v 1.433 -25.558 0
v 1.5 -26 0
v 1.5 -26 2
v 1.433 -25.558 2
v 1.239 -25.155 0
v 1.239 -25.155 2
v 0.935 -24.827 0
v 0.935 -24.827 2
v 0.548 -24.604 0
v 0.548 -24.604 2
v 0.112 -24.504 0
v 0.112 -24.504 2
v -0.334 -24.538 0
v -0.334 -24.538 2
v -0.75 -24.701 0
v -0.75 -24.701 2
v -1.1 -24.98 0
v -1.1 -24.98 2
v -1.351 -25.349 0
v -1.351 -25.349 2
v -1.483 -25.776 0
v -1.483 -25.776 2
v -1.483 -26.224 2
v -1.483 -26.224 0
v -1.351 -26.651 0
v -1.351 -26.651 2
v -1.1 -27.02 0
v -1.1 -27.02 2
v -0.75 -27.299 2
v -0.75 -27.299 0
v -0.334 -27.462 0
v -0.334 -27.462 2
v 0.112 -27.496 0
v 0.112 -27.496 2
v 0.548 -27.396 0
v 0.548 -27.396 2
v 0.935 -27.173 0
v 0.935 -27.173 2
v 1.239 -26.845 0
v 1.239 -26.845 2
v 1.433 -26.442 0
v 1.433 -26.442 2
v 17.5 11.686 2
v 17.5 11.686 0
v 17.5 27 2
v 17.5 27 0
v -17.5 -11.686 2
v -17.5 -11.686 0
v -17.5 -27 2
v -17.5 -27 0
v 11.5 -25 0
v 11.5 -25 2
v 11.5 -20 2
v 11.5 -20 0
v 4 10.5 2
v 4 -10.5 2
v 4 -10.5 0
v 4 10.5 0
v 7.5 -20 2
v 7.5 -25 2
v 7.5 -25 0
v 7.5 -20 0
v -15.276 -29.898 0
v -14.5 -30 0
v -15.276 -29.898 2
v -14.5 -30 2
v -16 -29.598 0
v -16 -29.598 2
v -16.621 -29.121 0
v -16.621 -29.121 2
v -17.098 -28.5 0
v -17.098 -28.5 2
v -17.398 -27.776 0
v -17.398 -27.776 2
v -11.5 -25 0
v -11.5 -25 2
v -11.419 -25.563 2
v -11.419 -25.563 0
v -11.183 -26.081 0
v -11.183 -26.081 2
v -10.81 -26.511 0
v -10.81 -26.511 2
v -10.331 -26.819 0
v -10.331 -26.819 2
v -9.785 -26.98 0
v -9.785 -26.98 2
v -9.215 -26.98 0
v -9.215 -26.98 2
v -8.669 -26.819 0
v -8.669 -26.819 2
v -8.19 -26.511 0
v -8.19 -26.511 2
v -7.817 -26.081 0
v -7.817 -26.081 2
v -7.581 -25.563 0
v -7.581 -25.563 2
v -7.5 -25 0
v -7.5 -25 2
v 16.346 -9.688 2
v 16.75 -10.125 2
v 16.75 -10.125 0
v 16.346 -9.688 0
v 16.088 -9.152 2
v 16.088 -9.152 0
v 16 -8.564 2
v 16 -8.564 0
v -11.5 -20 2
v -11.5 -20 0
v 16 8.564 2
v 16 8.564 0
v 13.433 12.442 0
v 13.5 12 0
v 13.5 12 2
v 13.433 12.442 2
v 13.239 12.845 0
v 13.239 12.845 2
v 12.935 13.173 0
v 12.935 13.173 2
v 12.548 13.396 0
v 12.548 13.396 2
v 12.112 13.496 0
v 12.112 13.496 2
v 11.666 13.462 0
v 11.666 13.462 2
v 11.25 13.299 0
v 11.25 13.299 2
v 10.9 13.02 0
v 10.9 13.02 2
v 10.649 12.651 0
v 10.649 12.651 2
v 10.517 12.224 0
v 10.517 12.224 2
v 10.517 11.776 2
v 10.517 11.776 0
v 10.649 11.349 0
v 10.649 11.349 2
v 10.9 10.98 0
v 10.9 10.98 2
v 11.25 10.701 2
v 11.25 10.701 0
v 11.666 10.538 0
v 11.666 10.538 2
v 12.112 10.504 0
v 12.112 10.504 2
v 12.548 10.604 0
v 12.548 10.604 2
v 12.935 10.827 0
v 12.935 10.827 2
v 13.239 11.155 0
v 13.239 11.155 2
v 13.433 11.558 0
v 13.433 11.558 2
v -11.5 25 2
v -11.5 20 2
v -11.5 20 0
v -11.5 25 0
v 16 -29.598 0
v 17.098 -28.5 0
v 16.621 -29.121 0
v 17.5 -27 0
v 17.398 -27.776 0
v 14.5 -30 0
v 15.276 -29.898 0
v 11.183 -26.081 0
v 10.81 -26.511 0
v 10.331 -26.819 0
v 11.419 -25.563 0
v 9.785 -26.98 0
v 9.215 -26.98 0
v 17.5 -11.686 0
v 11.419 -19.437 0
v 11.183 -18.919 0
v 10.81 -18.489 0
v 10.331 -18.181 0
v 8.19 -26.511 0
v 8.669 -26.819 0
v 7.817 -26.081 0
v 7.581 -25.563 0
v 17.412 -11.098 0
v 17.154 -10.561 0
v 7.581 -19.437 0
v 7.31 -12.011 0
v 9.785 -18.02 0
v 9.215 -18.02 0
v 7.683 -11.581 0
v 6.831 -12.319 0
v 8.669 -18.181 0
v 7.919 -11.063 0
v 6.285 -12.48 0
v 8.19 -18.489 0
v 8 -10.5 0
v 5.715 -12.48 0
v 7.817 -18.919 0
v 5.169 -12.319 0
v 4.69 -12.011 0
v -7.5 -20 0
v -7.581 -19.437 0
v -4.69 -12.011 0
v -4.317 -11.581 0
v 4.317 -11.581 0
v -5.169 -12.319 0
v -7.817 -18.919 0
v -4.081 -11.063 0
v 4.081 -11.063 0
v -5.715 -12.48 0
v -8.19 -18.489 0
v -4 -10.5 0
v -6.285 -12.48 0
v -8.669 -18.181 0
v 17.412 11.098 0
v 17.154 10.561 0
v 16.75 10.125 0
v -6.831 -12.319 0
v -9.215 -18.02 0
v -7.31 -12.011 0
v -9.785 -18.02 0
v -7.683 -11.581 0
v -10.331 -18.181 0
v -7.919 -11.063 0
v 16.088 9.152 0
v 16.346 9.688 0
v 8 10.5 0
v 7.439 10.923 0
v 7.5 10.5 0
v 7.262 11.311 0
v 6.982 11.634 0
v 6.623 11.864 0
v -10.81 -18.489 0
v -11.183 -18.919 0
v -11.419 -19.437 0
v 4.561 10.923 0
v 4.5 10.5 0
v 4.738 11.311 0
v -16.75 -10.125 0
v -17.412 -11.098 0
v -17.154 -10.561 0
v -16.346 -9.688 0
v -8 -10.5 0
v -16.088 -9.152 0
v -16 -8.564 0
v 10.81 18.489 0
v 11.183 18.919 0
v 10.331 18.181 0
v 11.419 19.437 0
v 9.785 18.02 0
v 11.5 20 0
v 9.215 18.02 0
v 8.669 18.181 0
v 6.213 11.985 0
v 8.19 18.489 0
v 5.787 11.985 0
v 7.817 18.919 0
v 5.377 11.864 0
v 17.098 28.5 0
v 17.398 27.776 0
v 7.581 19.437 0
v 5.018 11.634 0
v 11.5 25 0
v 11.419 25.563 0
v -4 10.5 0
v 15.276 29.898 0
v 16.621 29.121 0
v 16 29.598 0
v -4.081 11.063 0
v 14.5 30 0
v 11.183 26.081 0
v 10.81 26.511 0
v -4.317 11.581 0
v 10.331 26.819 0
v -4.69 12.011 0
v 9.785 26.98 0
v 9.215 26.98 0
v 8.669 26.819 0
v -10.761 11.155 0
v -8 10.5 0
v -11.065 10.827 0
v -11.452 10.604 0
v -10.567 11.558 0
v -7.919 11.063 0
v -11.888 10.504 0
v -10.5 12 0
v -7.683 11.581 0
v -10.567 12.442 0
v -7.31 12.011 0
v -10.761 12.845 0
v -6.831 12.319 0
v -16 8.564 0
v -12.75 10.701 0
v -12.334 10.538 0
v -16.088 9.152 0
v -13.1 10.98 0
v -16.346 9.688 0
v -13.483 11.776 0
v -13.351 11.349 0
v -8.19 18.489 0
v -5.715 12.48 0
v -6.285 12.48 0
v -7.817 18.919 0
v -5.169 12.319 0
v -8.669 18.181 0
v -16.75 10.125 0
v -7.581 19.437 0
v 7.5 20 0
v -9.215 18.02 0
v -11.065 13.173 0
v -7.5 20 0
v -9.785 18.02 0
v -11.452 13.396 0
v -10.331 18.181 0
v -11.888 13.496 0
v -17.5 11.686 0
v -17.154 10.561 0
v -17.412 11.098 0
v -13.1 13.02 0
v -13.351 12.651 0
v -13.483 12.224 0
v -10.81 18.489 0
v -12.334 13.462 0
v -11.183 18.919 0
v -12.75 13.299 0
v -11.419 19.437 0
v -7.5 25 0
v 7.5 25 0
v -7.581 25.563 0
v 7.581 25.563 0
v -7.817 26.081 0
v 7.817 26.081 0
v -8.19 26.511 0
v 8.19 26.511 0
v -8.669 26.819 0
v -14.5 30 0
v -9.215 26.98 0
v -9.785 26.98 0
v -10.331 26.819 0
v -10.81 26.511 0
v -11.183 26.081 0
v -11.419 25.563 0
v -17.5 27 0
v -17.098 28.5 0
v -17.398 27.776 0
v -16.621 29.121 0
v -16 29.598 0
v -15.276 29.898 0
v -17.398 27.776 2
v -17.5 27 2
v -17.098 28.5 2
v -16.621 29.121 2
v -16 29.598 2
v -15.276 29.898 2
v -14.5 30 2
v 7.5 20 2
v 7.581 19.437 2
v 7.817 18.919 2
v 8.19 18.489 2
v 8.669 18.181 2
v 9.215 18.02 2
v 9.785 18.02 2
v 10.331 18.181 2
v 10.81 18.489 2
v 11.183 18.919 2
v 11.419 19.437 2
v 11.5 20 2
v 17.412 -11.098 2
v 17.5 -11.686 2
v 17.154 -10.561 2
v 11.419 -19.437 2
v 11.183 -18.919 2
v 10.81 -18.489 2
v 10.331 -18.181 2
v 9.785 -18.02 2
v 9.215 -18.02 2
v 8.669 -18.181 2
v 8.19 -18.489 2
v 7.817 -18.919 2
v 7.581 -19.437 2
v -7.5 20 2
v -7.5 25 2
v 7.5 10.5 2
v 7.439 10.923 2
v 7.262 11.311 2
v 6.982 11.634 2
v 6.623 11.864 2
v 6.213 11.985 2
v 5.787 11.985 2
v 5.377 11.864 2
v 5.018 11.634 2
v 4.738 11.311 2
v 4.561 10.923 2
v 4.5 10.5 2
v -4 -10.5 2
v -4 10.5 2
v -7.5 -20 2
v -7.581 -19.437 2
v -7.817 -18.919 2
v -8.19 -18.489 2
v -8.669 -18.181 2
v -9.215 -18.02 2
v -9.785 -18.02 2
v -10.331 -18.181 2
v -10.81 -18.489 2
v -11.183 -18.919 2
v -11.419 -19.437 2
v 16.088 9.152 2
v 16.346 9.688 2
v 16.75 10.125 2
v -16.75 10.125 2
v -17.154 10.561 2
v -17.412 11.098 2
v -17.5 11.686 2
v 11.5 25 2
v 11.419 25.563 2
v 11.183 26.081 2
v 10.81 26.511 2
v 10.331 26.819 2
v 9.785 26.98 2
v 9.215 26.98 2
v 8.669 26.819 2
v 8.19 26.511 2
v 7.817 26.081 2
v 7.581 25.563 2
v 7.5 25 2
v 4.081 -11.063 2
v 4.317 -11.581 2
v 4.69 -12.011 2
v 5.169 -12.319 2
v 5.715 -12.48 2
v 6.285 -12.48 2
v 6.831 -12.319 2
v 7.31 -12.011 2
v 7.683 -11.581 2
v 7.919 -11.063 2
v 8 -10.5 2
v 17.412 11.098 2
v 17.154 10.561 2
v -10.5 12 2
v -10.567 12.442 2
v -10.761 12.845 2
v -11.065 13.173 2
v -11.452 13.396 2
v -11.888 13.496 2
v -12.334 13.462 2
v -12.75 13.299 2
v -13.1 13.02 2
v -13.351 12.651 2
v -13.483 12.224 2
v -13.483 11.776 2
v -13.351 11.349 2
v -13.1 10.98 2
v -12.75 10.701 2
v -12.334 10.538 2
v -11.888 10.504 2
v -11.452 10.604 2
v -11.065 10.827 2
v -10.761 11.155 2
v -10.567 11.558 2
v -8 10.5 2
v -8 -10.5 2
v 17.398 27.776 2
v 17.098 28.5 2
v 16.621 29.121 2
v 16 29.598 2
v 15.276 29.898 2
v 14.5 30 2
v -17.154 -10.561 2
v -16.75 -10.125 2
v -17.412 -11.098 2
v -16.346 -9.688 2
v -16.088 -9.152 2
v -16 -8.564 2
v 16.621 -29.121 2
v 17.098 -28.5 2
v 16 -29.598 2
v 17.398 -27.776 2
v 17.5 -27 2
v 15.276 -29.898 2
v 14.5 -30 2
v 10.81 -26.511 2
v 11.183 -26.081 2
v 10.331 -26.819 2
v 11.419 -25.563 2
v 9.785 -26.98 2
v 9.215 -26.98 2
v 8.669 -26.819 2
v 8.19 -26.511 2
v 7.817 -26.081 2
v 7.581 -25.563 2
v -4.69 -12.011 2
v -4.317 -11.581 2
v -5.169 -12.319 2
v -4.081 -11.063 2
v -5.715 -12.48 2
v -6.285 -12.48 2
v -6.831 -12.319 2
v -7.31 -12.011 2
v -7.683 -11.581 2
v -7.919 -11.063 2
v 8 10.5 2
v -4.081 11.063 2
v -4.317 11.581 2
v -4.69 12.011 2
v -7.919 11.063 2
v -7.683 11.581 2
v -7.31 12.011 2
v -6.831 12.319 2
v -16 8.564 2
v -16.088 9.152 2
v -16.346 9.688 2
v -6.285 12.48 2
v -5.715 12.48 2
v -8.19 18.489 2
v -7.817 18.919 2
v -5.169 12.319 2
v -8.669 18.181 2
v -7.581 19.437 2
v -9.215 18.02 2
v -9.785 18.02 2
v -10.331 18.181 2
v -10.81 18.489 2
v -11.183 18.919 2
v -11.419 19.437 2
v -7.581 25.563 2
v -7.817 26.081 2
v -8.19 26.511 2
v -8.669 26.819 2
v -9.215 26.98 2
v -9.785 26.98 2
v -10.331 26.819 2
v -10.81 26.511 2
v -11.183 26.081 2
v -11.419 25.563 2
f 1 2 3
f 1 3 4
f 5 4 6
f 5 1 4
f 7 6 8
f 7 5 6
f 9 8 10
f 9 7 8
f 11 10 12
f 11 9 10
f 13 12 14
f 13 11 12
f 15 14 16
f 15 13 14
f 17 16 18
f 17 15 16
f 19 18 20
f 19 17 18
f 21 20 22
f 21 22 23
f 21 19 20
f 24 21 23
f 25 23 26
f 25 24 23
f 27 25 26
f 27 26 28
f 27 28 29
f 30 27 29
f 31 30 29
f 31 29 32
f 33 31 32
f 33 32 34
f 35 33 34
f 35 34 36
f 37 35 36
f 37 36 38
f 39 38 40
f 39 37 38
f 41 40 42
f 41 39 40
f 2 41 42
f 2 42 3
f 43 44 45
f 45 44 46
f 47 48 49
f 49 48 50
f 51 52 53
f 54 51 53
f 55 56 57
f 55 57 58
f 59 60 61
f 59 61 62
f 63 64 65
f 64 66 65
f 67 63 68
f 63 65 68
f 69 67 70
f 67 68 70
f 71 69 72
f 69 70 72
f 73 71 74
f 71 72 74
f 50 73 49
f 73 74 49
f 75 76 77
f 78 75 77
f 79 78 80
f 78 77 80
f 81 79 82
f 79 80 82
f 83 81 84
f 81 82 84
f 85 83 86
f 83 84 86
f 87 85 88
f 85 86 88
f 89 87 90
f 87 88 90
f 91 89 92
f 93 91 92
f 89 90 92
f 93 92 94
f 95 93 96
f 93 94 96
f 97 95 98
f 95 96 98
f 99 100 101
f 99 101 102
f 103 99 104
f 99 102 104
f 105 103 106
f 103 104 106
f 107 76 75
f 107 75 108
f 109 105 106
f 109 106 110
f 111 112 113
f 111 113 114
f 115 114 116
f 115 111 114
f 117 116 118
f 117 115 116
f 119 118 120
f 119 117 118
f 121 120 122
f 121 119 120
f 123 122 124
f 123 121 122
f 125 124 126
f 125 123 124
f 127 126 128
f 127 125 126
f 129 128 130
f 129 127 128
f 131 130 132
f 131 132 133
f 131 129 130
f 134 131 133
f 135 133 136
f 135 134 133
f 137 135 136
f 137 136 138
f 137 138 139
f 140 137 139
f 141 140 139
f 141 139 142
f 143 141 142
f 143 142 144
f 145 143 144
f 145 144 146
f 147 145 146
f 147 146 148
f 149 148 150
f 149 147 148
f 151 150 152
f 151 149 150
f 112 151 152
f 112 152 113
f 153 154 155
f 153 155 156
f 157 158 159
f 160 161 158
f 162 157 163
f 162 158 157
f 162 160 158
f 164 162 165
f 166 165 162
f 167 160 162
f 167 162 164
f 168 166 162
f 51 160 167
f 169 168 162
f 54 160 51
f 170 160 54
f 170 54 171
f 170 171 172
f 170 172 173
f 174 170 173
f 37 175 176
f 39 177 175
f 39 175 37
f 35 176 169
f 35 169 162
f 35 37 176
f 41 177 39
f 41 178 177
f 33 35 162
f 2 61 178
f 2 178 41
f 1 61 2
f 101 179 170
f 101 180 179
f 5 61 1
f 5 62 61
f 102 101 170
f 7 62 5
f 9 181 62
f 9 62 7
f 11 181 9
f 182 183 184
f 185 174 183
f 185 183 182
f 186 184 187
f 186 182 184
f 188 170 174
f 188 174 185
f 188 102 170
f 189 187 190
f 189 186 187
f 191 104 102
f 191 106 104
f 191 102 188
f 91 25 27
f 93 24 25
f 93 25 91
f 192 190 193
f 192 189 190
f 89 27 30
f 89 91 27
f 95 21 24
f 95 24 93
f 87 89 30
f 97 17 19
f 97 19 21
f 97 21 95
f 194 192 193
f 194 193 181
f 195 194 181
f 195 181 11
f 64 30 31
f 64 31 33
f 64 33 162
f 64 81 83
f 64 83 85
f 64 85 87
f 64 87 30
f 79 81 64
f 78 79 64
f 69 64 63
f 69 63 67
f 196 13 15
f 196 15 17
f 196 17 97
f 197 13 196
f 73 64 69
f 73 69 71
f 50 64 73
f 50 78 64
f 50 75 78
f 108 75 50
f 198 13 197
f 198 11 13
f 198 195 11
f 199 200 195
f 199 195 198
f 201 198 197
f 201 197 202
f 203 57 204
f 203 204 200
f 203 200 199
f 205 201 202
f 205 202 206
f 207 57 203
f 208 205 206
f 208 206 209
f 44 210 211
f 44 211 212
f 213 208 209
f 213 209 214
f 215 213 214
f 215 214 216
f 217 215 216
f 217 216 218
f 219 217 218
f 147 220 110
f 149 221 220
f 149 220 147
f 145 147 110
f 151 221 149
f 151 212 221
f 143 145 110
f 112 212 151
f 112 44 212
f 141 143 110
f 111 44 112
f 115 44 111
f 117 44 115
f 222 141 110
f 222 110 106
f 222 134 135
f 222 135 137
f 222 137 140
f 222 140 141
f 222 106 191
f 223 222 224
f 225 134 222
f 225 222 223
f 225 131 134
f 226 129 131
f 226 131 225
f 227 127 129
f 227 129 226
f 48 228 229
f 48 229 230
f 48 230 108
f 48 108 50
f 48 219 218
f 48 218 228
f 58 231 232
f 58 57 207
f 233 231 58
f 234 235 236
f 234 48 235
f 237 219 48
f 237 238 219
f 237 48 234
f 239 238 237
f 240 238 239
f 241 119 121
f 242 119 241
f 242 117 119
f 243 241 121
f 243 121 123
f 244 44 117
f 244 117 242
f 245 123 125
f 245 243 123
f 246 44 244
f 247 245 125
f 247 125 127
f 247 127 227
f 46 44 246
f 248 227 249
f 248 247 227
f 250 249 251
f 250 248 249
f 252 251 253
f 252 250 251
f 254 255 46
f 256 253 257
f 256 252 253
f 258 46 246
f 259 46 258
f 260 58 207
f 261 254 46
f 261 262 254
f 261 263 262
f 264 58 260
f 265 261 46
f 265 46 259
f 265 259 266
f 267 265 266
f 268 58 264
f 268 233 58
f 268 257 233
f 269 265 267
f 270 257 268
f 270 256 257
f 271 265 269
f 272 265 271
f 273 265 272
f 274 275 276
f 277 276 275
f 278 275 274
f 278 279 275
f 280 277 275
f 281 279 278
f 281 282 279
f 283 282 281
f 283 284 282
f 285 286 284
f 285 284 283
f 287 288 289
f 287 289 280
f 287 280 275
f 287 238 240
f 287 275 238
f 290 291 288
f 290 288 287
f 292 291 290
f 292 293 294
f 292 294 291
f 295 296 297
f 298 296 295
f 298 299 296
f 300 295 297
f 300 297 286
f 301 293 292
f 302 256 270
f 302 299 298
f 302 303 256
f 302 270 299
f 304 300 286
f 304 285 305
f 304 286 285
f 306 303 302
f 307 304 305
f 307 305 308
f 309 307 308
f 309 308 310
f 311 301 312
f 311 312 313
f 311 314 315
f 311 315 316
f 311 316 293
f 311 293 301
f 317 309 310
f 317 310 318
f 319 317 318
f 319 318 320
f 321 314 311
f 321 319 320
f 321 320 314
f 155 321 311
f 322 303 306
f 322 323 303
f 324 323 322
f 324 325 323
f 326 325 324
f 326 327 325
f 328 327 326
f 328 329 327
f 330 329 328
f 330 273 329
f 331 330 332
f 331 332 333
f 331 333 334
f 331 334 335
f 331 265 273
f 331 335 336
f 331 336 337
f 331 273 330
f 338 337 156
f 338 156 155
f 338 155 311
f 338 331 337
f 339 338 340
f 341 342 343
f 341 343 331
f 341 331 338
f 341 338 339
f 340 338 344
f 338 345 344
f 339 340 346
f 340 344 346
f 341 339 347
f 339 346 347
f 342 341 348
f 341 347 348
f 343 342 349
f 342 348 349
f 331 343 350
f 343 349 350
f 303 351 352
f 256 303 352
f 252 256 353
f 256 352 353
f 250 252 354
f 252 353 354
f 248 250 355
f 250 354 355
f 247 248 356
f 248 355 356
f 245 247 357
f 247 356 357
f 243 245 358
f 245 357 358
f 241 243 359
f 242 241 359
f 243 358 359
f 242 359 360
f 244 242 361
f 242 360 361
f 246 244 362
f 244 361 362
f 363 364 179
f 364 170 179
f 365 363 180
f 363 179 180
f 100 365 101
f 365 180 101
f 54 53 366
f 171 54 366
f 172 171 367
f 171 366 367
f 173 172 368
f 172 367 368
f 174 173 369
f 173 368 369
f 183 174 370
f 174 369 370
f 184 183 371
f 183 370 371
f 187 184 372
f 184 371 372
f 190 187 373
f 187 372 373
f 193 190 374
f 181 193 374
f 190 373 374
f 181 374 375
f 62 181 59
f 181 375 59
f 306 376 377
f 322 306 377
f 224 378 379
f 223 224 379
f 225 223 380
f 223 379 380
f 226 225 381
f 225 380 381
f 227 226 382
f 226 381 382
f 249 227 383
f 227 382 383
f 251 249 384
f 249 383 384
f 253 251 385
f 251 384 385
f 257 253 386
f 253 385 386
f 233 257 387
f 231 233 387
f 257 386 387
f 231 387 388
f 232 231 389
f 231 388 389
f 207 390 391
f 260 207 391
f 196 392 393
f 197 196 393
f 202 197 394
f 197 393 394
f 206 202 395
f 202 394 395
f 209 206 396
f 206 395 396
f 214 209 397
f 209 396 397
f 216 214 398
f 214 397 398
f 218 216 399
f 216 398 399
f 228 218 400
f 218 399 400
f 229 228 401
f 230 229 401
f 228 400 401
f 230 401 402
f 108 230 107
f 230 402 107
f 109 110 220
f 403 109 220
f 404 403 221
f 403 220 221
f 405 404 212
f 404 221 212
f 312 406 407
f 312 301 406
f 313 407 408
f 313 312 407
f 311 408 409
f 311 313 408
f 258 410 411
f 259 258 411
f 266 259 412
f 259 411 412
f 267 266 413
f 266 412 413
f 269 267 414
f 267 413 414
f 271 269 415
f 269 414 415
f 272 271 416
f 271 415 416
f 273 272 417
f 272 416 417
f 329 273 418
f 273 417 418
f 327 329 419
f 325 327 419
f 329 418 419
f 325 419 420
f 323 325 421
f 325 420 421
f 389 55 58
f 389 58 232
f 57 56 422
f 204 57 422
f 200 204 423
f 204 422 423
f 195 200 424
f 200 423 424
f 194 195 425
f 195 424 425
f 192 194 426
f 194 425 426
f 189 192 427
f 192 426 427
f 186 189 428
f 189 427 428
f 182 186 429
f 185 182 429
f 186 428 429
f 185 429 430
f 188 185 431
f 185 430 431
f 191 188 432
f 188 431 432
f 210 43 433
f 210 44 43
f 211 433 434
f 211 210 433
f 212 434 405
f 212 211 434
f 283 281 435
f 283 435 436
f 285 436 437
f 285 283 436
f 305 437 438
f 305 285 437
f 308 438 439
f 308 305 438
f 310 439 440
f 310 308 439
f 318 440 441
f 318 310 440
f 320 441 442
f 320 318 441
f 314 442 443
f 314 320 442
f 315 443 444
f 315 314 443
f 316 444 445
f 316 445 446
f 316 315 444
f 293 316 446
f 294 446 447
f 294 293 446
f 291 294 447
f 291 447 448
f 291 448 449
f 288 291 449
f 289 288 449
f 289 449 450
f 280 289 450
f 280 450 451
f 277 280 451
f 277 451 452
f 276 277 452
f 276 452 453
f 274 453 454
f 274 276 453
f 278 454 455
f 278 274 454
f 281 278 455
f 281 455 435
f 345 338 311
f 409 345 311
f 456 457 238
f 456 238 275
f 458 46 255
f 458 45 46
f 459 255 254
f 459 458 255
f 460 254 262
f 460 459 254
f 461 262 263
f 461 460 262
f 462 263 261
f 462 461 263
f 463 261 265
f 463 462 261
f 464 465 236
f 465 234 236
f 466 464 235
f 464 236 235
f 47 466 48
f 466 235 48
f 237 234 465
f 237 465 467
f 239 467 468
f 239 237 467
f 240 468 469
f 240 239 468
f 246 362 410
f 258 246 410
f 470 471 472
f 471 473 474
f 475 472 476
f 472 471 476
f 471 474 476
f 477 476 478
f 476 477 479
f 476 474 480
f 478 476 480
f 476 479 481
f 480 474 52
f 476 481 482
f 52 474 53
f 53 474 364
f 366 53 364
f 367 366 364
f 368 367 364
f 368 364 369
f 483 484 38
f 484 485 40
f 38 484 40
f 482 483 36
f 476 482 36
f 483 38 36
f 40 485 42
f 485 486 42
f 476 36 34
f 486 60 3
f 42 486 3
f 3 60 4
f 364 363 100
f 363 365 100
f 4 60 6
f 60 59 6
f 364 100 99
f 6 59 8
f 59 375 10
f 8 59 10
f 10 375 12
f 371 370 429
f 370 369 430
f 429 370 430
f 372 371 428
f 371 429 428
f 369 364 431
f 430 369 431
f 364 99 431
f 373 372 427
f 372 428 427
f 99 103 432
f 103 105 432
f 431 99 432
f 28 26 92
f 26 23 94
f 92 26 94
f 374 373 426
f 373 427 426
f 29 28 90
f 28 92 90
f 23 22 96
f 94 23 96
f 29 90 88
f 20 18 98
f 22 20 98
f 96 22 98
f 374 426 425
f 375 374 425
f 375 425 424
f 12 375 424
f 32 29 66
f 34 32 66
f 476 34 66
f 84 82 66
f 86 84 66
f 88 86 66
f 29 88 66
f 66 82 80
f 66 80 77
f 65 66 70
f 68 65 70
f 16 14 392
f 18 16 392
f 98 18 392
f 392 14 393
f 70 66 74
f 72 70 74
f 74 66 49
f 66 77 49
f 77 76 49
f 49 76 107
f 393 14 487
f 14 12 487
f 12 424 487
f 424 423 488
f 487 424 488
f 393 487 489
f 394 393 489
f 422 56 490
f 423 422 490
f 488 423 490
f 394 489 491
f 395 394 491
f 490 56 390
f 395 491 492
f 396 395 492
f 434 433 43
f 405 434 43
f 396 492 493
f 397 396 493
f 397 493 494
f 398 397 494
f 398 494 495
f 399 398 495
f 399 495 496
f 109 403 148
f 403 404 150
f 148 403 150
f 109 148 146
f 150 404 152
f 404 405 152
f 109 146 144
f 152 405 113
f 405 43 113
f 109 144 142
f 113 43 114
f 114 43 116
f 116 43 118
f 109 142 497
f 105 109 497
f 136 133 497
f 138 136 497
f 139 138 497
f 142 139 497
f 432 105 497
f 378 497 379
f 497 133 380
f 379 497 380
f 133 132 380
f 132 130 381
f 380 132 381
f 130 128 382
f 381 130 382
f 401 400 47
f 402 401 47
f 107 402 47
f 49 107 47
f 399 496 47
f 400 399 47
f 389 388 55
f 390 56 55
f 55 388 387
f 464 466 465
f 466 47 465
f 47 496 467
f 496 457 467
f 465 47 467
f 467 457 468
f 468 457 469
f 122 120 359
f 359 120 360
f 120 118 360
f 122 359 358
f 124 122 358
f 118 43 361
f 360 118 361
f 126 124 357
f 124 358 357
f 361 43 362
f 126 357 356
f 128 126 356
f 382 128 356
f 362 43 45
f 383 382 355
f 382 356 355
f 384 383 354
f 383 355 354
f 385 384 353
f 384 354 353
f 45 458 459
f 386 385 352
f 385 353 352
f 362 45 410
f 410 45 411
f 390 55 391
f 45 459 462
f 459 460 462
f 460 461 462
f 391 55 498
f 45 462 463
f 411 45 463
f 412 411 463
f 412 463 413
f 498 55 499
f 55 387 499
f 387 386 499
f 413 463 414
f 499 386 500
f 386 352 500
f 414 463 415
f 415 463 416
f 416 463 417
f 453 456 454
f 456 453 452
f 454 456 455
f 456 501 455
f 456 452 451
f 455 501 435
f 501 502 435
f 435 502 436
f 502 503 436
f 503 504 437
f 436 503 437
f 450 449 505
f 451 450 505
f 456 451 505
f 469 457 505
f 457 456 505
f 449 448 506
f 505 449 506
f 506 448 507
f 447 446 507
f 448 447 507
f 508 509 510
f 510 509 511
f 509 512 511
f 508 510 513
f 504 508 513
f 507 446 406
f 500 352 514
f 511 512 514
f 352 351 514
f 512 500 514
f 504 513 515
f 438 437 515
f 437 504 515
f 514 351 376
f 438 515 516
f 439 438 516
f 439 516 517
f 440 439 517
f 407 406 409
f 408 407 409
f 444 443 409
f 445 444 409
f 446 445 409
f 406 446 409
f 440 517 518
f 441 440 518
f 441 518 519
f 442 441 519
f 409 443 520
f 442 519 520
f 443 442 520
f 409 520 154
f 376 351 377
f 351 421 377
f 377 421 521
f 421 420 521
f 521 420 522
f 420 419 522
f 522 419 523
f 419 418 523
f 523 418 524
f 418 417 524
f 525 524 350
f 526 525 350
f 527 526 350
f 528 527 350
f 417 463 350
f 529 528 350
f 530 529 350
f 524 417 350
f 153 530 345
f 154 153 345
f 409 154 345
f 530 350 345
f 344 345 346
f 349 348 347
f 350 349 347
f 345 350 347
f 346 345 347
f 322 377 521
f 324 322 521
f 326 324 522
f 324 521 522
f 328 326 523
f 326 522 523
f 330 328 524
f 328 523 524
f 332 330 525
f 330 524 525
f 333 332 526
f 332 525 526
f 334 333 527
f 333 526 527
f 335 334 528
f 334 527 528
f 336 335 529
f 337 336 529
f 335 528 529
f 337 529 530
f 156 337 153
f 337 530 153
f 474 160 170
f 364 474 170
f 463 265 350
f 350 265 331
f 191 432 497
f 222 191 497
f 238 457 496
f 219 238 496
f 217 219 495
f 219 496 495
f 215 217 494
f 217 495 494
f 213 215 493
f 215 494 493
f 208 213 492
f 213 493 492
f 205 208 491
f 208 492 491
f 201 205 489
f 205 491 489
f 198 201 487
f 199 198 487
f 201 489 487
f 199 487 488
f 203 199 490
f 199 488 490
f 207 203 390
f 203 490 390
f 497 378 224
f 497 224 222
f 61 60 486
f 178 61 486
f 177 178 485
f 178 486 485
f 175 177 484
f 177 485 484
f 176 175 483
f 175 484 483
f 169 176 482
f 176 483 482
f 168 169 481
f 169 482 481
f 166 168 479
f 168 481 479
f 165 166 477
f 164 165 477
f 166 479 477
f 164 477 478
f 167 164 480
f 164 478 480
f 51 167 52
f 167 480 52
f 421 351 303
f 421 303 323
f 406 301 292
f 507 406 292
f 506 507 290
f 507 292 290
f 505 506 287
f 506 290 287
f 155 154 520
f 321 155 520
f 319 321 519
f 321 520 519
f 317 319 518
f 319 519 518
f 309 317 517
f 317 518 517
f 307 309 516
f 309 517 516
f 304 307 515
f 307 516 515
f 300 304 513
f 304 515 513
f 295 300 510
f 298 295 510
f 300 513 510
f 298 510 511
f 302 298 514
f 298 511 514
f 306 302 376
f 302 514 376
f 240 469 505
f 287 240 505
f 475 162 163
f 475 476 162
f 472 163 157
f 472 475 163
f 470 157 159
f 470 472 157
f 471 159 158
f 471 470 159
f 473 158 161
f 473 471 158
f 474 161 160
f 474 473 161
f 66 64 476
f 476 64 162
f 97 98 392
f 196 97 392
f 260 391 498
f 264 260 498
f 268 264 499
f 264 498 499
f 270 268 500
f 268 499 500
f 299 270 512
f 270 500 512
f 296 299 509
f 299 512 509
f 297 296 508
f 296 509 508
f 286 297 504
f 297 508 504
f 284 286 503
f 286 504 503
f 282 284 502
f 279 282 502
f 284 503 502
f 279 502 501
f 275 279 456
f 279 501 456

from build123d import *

# Parameters (mm, degrees)
F0_R        = 1.5
F1_DEPTH    = 2
F2_R        = 3
F3_W        = 4
F3_H        = 5
F3_W_2      = 1.5
F3_H_2      = 21
F4_DEPTH    = 2.001
F5_R        = 2
F5_R_2      = 1.5
F6_DEPTH    = 2.001
F7_T1_DEPTH = 2
F8_R        = 2


# Not quite as in the source:
# - a fillet or chamfer that OpenCascade refuses, or shapes differently, is made with other operations: its cross-section is extruded or revolved along the edge and cut away or added


with BuildPart() as f1:
    # F0 (on Top) → F1 (new body)
    with BuildSketch(Plane.XY):
        Polygon((-17.5, 17.5), (-17.5, -17.5), (-17.5, -30), (17.5, -30), (17.5, -17.5), (17.5, 17.5), (17.5, 30), (-17.5, 30), align=None)
        with Locations((0, -26)):
            Circle(F0_R, mode=Mode.SUBTRACT)
        with Locations((-12, 12)):
            Circle(F0_R, mode=Mode.SUBTRACT)
        with Locations((12, 12)):
            Circle(F0_R, mode=Mode.SUBTRACT)
    extrude(amount=F1_DEPTH)

    # F2
    f2_edges = [f1.edges().sort_by_distance(p)[0] for p in [
        (-17.5, -30, 1),
        (17.5, -30, 1),
        (17.5, 30, 1),
        (-17.5, 30, 1),
    ]]
    fillet(f2_edges, radius=F2_R)

    # F3 (on face) → F4 (cut, through all)
    with BuildSketch(Plane.XY.offset(2)):
        with Locations((9.5, 22.5)):
            Rectangle(F3_W, F3_H)
        with Locations((9.5, -22.5)):
            Rectangle(F3_W, F3_H)
        with Locations((-9.5, -22.5)):
            Rectangle(F3_W, F3_H)
        with Locations((-9.5, 22.5)):
            Rectangle(F3_W, F3_H)
        with Locations((-16.75, 0)):
            Rectangle(F3_W_2, F3_H_2)
        with Locations((16.75, 0)):
            Rectangle(F3_W_2, F3_H_2)
        with Locations((-6, 0)):
            Rectangle(F3_W, F3_H_2)
        with Locations((6, 0)):
            Rectangle(F3_W, F3_H_2)
    extrude(amount=-F4_DEPTH, mode=Mode.SUBTRACT)

    # F5 (on face) → F6 (cut, through all)
    with BuildSketch(Plane.XY.offset(2)):
        with Locations((-9.5, 25)):
            Circle(F5_R)
        with Locations((9.5, 25)):
            Circle(F5_R)
        with Locations((9.5, -25)):
            Circle(F5_R)
        with Locations((-9.5, -25)):
            Circle(F5_R)
        with Locations((-9.5, -20)):
            Circle(F5_R)
        with Locations((9.5, -20)):
            Circle(F5_R)
        with Locations((6, -10.5)):
            Circle(F5_R)
        with Locations((-6, -10.5)):
            Circle(F5_R)
        with Locations((-6, 10.5)):
            Circle(F5_R)
        with Locations((6, 10.5)):
            Circle(F5_R_2)
        with Locations((9.5, 20)):
            Circle(F5_R)
        with Locations((-9.5, 20)):
            Circle(F5_R)
    extrude(amount=-F6_DEPTH, mode=Mode.SUBTRACT)

    # F7: fillet of radius 2 on 4 edges, made by hand

    # F7_s2 → F7_t1 (join)
    with BuildSketch(Plane.XY):
        with BuildLine():
            ThreePointArc((-17.5, -10.5), (-16.4188611699, -9.7882531983), (-16, -8.5635083269))
            Line((-16, -8.5635083269), (-16, -10.5))
            Line((-16, -10.5), (-17.5, -10.5))
        make_face()
        with BuildLine():
            ThreePointArc((-17.5, 10.5), (-16.4188611699, 9.7882531983), (-16, 8.5635083269))
            Line((-16, 8.5635083269), (-16, 10.5))
            Line((-16, 10.5), (-17.5, 10.5))
        make_face()
        with BuildLine():
            ThreePointArc((16, 8.5635083269), (16.4188611699, 9.7882531983), (17.5, 10.5))
            Line((17.5, 10.5), (16, 10.5))
            Line((16, 10.5), (16, 8.5635083269))
        make_face()
        with BuildLine():
            ThreePointArc((17.5, -10.5), (16.4188611699, -9.7882531983), (16, -8.5635083269))
            Line((16, -8.5635083269), (16, -10.5))
            Line((16, -10.5), (17.5, -10.5))
        make_face()
    extrude(amount=F7_T1_DEPTH)

    # F8
    f8_edges = [f1.edges().sort_by_distance(p)[0] for p in [
        (17.5, -10.5, 1),
        (17.5, 10.5, 1),
        (-17.5, -10.5, 1),
        (-17.5, 10.5, 1),
    ]]
    fillet(f8_edges, radius=F8_R)


solid = f1.part
